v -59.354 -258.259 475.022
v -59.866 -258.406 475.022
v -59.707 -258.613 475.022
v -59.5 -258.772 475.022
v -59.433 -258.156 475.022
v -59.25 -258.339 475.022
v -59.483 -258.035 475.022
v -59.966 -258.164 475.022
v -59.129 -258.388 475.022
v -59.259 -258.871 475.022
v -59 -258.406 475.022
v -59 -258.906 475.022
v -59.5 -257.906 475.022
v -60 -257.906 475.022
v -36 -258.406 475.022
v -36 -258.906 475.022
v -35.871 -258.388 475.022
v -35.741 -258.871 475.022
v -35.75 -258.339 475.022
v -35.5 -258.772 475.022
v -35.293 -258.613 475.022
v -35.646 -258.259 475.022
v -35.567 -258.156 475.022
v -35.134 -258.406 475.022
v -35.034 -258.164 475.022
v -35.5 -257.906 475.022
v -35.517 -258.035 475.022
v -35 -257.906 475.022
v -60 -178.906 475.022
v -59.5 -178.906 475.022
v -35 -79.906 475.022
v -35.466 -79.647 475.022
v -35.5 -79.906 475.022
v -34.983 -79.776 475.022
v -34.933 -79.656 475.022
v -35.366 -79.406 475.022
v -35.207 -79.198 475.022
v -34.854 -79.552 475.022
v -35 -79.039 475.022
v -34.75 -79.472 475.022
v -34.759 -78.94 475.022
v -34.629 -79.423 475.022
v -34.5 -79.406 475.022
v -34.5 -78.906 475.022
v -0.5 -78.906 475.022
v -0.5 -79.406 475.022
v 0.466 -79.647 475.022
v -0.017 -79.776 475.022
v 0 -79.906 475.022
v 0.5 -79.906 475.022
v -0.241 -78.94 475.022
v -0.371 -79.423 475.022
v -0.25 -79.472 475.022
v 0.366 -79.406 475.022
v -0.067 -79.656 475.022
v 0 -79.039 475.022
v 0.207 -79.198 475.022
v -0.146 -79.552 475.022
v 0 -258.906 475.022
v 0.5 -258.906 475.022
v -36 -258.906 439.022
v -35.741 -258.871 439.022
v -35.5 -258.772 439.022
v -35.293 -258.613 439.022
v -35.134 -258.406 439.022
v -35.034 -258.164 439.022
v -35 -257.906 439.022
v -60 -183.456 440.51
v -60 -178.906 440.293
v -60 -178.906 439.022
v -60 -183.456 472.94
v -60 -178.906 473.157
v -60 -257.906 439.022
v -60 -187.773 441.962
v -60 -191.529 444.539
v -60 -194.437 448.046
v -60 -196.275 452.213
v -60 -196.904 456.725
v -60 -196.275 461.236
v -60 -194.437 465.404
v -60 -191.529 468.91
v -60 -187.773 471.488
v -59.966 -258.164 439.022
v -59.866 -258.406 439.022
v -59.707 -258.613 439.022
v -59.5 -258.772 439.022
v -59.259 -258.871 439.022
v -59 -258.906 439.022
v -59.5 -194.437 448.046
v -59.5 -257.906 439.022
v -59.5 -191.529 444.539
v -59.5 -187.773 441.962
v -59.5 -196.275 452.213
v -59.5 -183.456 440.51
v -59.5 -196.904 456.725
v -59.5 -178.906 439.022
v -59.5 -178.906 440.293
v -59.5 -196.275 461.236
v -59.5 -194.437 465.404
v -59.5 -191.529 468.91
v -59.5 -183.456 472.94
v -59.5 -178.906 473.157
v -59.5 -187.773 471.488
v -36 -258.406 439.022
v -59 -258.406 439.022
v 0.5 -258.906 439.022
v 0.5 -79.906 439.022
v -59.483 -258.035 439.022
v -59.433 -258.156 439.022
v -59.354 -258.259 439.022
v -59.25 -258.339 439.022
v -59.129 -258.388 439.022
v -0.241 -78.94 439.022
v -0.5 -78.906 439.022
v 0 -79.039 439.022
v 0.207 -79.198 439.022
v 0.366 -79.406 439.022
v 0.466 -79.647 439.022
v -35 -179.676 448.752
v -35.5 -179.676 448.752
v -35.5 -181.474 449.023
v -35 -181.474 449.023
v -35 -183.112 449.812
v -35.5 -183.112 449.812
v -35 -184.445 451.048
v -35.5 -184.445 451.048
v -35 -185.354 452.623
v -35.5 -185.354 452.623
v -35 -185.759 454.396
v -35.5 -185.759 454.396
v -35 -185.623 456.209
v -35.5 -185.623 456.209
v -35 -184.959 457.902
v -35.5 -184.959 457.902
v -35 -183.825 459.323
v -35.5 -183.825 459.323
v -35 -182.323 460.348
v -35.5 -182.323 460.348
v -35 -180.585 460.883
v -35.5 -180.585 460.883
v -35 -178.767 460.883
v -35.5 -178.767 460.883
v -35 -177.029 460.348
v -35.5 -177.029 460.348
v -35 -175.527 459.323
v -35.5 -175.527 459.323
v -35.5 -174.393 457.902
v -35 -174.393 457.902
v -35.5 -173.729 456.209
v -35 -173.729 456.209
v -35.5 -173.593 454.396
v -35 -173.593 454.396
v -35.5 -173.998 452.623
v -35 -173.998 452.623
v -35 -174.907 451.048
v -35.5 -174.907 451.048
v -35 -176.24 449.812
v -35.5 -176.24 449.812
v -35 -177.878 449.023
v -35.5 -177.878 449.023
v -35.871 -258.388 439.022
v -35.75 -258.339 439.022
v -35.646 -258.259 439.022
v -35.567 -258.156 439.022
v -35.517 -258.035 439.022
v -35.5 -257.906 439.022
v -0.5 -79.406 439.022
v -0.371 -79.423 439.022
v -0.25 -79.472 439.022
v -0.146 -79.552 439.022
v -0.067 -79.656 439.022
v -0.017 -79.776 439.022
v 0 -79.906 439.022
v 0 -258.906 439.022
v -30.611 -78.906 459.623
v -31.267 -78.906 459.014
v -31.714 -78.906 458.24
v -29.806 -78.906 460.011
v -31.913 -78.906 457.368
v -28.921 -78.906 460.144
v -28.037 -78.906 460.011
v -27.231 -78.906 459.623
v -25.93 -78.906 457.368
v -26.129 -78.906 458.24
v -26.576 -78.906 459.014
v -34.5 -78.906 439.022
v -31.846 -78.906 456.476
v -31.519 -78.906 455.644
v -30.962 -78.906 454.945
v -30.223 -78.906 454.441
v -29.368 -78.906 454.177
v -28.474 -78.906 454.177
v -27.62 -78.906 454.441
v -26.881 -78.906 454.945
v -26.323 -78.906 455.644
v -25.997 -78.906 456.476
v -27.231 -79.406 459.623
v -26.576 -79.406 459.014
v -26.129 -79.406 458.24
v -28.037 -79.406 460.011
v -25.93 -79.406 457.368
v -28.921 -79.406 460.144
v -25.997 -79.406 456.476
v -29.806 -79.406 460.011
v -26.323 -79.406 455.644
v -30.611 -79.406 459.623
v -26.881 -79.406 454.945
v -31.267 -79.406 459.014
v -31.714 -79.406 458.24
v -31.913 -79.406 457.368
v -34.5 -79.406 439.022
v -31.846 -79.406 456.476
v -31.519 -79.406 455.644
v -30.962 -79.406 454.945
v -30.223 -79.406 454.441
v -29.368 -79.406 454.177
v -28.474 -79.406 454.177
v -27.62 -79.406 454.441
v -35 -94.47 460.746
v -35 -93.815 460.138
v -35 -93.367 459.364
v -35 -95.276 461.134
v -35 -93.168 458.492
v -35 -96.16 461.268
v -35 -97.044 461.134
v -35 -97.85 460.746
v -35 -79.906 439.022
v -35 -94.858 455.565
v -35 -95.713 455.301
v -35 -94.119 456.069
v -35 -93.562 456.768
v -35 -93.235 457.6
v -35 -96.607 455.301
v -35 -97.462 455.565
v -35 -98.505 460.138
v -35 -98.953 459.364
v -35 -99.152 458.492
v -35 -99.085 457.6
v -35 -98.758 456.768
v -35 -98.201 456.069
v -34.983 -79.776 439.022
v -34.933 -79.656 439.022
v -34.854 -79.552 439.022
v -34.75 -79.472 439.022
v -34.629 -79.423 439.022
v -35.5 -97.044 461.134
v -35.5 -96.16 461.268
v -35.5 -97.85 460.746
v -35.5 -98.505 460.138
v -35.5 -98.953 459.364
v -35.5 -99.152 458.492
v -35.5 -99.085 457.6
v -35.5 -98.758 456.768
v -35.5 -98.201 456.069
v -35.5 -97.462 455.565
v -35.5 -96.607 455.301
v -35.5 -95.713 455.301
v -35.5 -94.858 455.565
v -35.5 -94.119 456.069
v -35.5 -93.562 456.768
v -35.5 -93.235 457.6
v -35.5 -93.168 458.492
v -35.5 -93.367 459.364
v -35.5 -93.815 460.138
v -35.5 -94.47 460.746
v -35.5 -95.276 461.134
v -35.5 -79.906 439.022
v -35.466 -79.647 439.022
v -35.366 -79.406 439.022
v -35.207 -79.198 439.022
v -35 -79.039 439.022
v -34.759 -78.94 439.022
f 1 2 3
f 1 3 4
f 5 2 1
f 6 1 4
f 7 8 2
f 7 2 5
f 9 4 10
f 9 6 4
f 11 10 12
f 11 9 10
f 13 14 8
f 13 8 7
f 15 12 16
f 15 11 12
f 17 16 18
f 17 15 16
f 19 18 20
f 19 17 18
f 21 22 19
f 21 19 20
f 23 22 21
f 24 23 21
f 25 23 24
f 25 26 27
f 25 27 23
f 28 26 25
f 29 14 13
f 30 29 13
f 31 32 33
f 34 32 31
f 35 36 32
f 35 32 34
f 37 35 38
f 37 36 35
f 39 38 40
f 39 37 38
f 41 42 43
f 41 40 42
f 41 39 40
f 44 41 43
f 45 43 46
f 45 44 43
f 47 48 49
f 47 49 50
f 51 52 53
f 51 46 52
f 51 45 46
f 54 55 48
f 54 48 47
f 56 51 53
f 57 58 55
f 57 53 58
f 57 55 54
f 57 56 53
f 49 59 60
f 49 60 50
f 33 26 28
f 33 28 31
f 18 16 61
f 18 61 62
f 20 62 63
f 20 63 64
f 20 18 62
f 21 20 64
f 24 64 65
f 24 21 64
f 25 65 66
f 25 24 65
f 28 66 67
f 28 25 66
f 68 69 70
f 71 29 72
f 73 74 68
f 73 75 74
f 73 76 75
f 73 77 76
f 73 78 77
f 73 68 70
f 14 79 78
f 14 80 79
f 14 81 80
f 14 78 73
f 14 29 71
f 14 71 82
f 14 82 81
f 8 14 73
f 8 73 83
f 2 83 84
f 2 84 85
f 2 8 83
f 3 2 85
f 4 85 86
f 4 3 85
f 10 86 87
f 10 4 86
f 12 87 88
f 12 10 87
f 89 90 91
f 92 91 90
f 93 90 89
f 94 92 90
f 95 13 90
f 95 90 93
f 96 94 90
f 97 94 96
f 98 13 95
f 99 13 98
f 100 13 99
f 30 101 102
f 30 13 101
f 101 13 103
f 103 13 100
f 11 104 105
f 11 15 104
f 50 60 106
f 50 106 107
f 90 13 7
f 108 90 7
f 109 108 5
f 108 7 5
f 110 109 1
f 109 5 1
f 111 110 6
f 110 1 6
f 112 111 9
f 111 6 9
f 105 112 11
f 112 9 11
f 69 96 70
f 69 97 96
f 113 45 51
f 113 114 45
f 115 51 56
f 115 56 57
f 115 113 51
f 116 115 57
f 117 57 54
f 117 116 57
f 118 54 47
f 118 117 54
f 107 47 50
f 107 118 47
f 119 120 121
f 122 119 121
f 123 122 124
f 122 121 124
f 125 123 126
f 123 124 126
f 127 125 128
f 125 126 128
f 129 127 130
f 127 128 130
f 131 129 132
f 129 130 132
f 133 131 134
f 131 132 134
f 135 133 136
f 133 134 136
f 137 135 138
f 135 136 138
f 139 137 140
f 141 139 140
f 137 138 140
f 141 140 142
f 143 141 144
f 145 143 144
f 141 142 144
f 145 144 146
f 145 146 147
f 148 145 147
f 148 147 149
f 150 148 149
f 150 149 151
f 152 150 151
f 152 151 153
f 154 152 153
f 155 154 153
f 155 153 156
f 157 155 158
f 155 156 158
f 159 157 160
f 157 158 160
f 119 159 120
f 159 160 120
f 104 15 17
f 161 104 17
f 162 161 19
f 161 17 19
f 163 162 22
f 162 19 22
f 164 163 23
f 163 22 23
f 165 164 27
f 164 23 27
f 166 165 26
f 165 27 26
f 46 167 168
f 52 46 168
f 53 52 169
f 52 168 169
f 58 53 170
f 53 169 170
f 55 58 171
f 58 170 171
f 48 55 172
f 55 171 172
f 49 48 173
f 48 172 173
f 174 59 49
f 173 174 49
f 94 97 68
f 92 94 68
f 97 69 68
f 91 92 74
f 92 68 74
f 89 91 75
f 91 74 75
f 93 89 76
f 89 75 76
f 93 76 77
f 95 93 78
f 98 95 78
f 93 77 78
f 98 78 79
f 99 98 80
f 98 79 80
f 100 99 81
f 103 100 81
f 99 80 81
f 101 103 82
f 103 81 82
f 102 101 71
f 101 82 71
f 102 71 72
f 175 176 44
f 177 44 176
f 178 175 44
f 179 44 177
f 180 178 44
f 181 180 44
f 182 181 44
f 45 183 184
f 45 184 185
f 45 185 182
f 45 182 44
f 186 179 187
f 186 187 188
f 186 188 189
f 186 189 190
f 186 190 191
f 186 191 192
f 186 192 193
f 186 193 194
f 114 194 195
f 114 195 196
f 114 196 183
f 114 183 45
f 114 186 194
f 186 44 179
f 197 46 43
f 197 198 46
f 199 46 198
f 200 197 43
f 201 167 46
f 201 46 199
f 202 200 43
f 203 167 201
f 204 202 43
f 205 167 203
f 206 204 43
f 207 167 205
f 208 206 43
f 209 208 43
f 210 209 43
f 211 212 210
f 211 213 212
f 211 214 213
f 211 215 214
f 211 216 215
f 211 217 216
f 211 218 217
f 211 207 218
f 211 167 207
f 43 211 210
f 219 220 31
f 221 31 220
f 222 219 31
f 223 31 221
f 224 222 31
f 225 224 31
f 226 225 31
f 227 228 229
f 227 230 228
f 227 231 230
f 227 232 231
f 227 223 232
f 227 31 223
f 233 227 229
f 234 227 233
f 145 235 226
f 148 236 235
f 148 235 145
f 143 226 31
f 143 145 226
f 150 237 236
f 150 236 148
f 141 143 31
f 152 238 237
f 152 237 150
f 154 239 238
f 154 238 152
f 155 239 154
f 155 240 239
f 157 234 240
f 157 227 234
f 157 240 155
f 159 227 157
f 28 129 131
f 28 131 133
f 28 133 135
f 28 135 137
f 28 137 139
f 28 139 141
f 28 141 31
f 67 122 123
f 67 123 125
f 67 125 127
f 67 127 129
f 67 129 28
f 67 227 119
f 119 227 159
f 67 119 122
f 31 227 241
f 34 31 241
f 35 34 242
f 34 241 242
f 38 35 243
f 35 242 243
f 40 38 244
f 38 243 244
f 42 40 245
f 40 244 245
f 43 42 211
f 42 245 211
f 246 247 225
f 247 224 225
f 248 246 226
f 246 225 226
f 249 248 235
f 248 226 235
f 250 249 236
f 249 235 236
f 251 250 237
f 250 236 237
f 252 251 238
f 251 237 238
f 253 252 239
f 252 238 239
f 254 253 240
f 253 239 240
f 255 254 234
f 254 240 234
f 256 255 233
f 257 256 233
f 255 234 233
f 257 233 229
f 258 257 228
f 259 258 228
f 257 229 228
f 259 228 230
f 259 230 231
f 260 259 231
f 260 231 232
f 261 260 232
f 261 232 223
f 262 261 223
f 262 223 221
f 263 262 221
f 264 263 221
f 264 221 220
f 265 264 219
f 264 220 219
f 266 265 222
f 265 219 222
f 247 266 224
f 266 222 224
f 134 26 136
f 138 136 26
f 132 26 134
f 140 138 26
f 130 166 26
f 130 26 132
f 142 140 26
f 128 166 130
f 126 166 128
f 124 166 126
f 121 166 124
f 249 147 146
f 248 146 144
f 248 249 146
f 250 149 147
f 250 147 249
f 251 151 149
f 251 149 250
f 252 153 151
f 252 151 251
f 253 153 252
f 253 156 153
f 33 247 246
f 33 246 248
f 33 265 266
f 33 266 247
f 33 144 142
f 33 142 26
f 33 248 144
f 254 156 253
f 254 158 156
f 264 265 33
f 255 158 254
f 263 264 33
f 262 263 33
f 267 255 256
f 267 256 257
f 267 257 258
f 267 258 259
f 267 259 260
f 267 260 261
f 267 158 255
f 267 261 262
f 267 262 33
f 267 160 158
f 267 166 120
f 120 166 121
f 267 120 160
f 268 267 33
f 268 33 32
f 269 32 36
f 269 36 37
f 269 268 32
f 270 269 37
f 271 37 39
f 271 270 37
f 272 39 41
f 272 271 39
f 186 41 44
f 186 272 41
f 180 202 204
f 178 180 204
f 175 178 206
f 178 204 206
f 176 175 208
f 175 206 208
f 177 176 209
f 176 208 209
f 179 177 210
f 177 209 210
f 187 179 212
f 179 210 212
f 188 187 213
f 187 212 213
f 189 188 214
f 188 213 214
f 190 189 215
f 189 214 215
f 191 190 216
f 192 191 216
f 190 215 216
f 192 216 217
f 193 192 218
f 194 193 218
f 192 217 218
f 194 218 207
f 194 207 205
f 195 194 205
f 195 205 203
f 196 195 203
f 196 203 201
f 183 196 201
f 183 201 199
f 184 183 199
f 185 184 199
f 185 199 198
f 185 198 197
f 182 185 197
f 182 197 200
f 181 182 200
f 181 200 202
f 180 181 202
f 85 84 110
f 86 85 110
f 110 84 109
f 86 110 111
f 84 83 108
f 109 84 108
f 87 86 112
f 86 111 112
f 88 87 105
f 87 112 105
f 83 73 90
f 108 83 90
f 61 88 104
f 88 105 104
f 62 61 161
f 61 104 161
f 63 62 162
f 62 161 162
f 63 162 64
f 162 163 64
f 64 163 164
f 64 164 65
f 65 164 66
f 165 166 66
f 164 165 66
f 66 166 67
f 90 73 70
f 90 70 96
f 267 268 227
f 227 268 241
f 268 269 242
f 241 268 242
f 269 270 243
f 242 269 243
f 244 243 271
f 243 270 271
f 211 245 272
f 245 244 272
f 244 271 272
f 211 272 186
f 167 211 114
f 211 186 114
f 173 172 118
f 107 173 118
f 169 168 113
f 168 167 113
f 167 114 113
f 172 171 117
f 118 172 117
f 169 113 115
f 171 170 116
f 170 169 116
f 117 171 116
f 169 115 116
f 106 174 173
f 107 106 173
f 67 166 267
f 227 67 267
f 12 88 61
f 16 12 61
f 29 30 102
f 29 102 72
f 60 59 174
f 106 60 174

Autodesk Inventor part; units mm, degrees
ref_plane "YZ Plane" through (0, 0, 0) normal (1, 0, 0) x (0, 1, 0)
ref_plane "XZ Plane" through (0, 0, 0) normal (0, 1, 0) x (-1, 0, 0)
ref_plane "XY Plane" through (0, 0, 0) normal (0, 0, 1) x (1, 0, 0)
sketch "Sketch1" plane through (0, 0, 0) normal (1, 0, 0) x (0, 1, 0)
  line L0 (-78.9055, 475.022) -> (-258.9055, 475.022)
  line L1 (-258.9055, 475.022) -> (-258.9055, 439.022)
  line L2 (-258.9055, 439.022) -> (-78.9055, 439.022)
  line L3 (-78.9055, 439.022) -> (-78.9055, 475.022)
  point P0 (0, 0)
  dimension "d0" = 180
  dimension "d1" = 36
extrude "Plate1" add sketch "Sketch1" along normal blind 0.5
sketch "Sketch2" plane through (0.5, -79.4055, 475.022) normal (0, 1, 0) x (1, 0, 0)
  line L0 (0, -36) -> (0, 0)
  line L1 (0, 0) -> (-36, 0)
  line L2 (-36, 0) -> (-36, -36)
  line L3 (-36, -36) -> (0, -36)
edge flange "Flange1" height 36 angle 90 thickness 0.5 bend radius 0.5 thickness toward (0, 1, 0) relief tear relief width 0.5 relief depth 0.25 edges at (0.5, -78.9055, 457.022) wall of the first edge with corners at (0.5, -79.4055, 439.022) (0.5, -79.4055, 475.022) (-35.5, -79.4055, 475.022) (-35.5, -79.4055, 439.022)
bend "Bend1"
corner "Corner1"
sketch "Sketch3" plane through (-35, -78.9055, 475.022) normal (-1, 0, 0) x (0, 1, 0)
  line L0 (0, -36) -> (0, 0)
  line L1 (0, 0) -> (-180, 0)
  line L2 (-180, 0) -> (-180, -36)
  line L3 (-180, -36) -> (0, -36)
edge flange "Flange2" height 180 angle 90 thickness 0.5 bend radius 0.5 thickness toward (-1, 0, 0) relief tear relief width 0.5 relief depth 0.25 edges at (-35.5, -78.9055, 457.022) wall of the first edge with corners at (-35, -78.9055, 439.022) (-35, -78.9055, 475.022) (-35, -258.9055, 475.022) (-35, -258.9055, 439.022)
bend "Bend2"
corner "Corner2"
sketch "Sketch4" plane through (-35, -258.4055, 439.022) normal (0, -1, 0) x (-1, 0, 0)
  line L0 (0, 36) -> (0, 0)
  line L1 (0, 0) -> (25, 0)
  line L2 (25, 0) -> (25, 36)
  line L3 (25, 36) -> (0, 36)
edge flange "Flange3" height 25 angle 90 thickness 0.5 bend radius 0.5 thickness toward (0, -1, 0) relief tear relief width 0.5 relief depth 0.25 edges at (-35, -258.9055, 457.022) wall of the first edge with corners at (-35, -258.4055, 475.022) (-35, -258.4055, 439.022) (-60, -258.4055, 439.022) (-60, -258.4055, 475.022)
bend "Bend3"
corner "Corner3"
sketch "Sketch5" plane through (-59.5, -258.9055, 475.022) normal (-1, 0, 0) x (0, -1, 0)
  line L0 (0, -36) -> (0, 0)
  line L1 (0, 0) -> (-80, 0)
  line L2 (-80, 0) -> (-80, -36)
  line L3 (-80, -36) -> (0, -36)
edge flange "Flange4" height 80 angle 90 thickness 0.5 bend radius 0.5 thickness toward (-1, 0, 0) relief tear relief width 0.5 relief depth 0.25 edges at (-60, -258.4055, 457.022) wall of the first edge with corners at (-59.5, -258.9055, 439.022) (-59.5, -258.9055, 475.022) (-59.5, -178.9055, 475.022) (-59.5, -178.9055, 439.022)
bend "Bend4"
corner "Corner4"
sketch "Sketch6" plane through (-59.5, -178.9055, 475.022) normal (1, 0, 0) x (0, 0, -1)
  point P0 (475.022, 178.9055)
  point P1 (18.2971, -1.4985)
hole "Hole1" at (-59.5, -180.404, 456.7249) direction (-1, 0, 0) diameter 33 depth 33 tip angle 118
sketch "Sketch7" plane through (-35, -79.9055, 475.022) normal (1, 0, 0) x (0, 0, -1)
  point P0 (475.022, 79.9055)
  point P1 (20.1704, -99.7704)
hole "Hole2" at (-35, -179.6759, 454.8516) direction (-1, 0, 0) diameter 12.2 depth 0.5 tip angle 118
sketch "Sketch8" plane through (-0.5, -78.9055, 475.022) normal (0, 1, 0) x (1, 0, 0)
  point P0 (0.5, 475.022)
  point P1 (-28.4213, 17.8782)
hole "Hole3" at (-28.9213, -78.9055, 457.1438) direction (0, -1, 0) diameter 6 depth 0.75 tip angle 118
sketch "Sketch9" plane through (-35.5, -79.9055, 439.022) normal (-1, 0, 0) x (0, 0, 1)
  point P0 (-439.022, 79.9055)
  point P1 (19.2457, -16.2545)
hole "Hole4" at (-35.5, -96.16, 458.2677) direction (1, 0, 0) diameter 6 depth 0.5 tip angle 118
equation "\"d55\" = Thickness"
equation "\"d69\" = Thickness"
equation "\"d2\" = Thickness"
equation "\"d3\" = BendReliefWidth"
equation "\"d4\" = BendReliefDepth"
equation "\"d5\" = MinimumRemnant"
equation "\"d6\" = TransitionRadius"
equation "\"d9\" = BendRadius"
equation "\"d10\" = CornerReliefSize"
equation "\"d11\" = GapSize"
equation "\"d12\" = JacobiRadiusSize"
equation "\"d13\" = BendReliefWidth"
equation "\"d14\" = BendReliefDepth"
equation "\"d15\" = MinimumRemnant"
equation "\"d16\" = TransitionRadius"
equation "\"d19\" = BendRadius"
equation "\"d20\" = CornerReliefSize"
equation "\"d21\" = GapSize"
equation "\"d22\" = JacobiRadiusSize"
equation "\"d23\" = BendReliefWidth"
equation "\"d24\" = BendReliefDepth"
equation "\"d25\" = MinimumRemnant"
equation "\"d26\" = TransitionRadius"
equation "\"d29\" = BendRadius"
equation "\"d30\" = CornerReliefSize"
equation "\"d31\" = GapSize"
equation "\"d32\" = JacobiRadiusSize"
equation "\"d33\" = BendReliefWidth"
equation "\"d34\" = BendReliefDepth"
equation "\"d35\" = MinimumRemnant"
equation "\"d36\" = TransitionRadius"
equation "\"d39\" = BendRadius"
equation "\"d40\" = CornerReliefSize"
equation "\"d41\" = GapSize"
equation "\"d42\" = JacobiRadiusSize"
equation "\"BendRadius\" = Thickness"
equation "\"BendReliefWidth\" = Thickness"
equation "\"BendReliefDepth\" = 0.5 * Thickness"
equation "\"CornerReliefSize\" = 4 * Thickness"
equation "\"MinimumRemnant\" = 2 * Thickness"
equation "\"TransitionRadius\" = BendRadius"
equation "\"JacobiRadiusSize\" = BendRadius"
equation "\"GapSize\" = Thickness"
equation "\"Thickness\" = 0.5"
properties part number "strikkkk"
